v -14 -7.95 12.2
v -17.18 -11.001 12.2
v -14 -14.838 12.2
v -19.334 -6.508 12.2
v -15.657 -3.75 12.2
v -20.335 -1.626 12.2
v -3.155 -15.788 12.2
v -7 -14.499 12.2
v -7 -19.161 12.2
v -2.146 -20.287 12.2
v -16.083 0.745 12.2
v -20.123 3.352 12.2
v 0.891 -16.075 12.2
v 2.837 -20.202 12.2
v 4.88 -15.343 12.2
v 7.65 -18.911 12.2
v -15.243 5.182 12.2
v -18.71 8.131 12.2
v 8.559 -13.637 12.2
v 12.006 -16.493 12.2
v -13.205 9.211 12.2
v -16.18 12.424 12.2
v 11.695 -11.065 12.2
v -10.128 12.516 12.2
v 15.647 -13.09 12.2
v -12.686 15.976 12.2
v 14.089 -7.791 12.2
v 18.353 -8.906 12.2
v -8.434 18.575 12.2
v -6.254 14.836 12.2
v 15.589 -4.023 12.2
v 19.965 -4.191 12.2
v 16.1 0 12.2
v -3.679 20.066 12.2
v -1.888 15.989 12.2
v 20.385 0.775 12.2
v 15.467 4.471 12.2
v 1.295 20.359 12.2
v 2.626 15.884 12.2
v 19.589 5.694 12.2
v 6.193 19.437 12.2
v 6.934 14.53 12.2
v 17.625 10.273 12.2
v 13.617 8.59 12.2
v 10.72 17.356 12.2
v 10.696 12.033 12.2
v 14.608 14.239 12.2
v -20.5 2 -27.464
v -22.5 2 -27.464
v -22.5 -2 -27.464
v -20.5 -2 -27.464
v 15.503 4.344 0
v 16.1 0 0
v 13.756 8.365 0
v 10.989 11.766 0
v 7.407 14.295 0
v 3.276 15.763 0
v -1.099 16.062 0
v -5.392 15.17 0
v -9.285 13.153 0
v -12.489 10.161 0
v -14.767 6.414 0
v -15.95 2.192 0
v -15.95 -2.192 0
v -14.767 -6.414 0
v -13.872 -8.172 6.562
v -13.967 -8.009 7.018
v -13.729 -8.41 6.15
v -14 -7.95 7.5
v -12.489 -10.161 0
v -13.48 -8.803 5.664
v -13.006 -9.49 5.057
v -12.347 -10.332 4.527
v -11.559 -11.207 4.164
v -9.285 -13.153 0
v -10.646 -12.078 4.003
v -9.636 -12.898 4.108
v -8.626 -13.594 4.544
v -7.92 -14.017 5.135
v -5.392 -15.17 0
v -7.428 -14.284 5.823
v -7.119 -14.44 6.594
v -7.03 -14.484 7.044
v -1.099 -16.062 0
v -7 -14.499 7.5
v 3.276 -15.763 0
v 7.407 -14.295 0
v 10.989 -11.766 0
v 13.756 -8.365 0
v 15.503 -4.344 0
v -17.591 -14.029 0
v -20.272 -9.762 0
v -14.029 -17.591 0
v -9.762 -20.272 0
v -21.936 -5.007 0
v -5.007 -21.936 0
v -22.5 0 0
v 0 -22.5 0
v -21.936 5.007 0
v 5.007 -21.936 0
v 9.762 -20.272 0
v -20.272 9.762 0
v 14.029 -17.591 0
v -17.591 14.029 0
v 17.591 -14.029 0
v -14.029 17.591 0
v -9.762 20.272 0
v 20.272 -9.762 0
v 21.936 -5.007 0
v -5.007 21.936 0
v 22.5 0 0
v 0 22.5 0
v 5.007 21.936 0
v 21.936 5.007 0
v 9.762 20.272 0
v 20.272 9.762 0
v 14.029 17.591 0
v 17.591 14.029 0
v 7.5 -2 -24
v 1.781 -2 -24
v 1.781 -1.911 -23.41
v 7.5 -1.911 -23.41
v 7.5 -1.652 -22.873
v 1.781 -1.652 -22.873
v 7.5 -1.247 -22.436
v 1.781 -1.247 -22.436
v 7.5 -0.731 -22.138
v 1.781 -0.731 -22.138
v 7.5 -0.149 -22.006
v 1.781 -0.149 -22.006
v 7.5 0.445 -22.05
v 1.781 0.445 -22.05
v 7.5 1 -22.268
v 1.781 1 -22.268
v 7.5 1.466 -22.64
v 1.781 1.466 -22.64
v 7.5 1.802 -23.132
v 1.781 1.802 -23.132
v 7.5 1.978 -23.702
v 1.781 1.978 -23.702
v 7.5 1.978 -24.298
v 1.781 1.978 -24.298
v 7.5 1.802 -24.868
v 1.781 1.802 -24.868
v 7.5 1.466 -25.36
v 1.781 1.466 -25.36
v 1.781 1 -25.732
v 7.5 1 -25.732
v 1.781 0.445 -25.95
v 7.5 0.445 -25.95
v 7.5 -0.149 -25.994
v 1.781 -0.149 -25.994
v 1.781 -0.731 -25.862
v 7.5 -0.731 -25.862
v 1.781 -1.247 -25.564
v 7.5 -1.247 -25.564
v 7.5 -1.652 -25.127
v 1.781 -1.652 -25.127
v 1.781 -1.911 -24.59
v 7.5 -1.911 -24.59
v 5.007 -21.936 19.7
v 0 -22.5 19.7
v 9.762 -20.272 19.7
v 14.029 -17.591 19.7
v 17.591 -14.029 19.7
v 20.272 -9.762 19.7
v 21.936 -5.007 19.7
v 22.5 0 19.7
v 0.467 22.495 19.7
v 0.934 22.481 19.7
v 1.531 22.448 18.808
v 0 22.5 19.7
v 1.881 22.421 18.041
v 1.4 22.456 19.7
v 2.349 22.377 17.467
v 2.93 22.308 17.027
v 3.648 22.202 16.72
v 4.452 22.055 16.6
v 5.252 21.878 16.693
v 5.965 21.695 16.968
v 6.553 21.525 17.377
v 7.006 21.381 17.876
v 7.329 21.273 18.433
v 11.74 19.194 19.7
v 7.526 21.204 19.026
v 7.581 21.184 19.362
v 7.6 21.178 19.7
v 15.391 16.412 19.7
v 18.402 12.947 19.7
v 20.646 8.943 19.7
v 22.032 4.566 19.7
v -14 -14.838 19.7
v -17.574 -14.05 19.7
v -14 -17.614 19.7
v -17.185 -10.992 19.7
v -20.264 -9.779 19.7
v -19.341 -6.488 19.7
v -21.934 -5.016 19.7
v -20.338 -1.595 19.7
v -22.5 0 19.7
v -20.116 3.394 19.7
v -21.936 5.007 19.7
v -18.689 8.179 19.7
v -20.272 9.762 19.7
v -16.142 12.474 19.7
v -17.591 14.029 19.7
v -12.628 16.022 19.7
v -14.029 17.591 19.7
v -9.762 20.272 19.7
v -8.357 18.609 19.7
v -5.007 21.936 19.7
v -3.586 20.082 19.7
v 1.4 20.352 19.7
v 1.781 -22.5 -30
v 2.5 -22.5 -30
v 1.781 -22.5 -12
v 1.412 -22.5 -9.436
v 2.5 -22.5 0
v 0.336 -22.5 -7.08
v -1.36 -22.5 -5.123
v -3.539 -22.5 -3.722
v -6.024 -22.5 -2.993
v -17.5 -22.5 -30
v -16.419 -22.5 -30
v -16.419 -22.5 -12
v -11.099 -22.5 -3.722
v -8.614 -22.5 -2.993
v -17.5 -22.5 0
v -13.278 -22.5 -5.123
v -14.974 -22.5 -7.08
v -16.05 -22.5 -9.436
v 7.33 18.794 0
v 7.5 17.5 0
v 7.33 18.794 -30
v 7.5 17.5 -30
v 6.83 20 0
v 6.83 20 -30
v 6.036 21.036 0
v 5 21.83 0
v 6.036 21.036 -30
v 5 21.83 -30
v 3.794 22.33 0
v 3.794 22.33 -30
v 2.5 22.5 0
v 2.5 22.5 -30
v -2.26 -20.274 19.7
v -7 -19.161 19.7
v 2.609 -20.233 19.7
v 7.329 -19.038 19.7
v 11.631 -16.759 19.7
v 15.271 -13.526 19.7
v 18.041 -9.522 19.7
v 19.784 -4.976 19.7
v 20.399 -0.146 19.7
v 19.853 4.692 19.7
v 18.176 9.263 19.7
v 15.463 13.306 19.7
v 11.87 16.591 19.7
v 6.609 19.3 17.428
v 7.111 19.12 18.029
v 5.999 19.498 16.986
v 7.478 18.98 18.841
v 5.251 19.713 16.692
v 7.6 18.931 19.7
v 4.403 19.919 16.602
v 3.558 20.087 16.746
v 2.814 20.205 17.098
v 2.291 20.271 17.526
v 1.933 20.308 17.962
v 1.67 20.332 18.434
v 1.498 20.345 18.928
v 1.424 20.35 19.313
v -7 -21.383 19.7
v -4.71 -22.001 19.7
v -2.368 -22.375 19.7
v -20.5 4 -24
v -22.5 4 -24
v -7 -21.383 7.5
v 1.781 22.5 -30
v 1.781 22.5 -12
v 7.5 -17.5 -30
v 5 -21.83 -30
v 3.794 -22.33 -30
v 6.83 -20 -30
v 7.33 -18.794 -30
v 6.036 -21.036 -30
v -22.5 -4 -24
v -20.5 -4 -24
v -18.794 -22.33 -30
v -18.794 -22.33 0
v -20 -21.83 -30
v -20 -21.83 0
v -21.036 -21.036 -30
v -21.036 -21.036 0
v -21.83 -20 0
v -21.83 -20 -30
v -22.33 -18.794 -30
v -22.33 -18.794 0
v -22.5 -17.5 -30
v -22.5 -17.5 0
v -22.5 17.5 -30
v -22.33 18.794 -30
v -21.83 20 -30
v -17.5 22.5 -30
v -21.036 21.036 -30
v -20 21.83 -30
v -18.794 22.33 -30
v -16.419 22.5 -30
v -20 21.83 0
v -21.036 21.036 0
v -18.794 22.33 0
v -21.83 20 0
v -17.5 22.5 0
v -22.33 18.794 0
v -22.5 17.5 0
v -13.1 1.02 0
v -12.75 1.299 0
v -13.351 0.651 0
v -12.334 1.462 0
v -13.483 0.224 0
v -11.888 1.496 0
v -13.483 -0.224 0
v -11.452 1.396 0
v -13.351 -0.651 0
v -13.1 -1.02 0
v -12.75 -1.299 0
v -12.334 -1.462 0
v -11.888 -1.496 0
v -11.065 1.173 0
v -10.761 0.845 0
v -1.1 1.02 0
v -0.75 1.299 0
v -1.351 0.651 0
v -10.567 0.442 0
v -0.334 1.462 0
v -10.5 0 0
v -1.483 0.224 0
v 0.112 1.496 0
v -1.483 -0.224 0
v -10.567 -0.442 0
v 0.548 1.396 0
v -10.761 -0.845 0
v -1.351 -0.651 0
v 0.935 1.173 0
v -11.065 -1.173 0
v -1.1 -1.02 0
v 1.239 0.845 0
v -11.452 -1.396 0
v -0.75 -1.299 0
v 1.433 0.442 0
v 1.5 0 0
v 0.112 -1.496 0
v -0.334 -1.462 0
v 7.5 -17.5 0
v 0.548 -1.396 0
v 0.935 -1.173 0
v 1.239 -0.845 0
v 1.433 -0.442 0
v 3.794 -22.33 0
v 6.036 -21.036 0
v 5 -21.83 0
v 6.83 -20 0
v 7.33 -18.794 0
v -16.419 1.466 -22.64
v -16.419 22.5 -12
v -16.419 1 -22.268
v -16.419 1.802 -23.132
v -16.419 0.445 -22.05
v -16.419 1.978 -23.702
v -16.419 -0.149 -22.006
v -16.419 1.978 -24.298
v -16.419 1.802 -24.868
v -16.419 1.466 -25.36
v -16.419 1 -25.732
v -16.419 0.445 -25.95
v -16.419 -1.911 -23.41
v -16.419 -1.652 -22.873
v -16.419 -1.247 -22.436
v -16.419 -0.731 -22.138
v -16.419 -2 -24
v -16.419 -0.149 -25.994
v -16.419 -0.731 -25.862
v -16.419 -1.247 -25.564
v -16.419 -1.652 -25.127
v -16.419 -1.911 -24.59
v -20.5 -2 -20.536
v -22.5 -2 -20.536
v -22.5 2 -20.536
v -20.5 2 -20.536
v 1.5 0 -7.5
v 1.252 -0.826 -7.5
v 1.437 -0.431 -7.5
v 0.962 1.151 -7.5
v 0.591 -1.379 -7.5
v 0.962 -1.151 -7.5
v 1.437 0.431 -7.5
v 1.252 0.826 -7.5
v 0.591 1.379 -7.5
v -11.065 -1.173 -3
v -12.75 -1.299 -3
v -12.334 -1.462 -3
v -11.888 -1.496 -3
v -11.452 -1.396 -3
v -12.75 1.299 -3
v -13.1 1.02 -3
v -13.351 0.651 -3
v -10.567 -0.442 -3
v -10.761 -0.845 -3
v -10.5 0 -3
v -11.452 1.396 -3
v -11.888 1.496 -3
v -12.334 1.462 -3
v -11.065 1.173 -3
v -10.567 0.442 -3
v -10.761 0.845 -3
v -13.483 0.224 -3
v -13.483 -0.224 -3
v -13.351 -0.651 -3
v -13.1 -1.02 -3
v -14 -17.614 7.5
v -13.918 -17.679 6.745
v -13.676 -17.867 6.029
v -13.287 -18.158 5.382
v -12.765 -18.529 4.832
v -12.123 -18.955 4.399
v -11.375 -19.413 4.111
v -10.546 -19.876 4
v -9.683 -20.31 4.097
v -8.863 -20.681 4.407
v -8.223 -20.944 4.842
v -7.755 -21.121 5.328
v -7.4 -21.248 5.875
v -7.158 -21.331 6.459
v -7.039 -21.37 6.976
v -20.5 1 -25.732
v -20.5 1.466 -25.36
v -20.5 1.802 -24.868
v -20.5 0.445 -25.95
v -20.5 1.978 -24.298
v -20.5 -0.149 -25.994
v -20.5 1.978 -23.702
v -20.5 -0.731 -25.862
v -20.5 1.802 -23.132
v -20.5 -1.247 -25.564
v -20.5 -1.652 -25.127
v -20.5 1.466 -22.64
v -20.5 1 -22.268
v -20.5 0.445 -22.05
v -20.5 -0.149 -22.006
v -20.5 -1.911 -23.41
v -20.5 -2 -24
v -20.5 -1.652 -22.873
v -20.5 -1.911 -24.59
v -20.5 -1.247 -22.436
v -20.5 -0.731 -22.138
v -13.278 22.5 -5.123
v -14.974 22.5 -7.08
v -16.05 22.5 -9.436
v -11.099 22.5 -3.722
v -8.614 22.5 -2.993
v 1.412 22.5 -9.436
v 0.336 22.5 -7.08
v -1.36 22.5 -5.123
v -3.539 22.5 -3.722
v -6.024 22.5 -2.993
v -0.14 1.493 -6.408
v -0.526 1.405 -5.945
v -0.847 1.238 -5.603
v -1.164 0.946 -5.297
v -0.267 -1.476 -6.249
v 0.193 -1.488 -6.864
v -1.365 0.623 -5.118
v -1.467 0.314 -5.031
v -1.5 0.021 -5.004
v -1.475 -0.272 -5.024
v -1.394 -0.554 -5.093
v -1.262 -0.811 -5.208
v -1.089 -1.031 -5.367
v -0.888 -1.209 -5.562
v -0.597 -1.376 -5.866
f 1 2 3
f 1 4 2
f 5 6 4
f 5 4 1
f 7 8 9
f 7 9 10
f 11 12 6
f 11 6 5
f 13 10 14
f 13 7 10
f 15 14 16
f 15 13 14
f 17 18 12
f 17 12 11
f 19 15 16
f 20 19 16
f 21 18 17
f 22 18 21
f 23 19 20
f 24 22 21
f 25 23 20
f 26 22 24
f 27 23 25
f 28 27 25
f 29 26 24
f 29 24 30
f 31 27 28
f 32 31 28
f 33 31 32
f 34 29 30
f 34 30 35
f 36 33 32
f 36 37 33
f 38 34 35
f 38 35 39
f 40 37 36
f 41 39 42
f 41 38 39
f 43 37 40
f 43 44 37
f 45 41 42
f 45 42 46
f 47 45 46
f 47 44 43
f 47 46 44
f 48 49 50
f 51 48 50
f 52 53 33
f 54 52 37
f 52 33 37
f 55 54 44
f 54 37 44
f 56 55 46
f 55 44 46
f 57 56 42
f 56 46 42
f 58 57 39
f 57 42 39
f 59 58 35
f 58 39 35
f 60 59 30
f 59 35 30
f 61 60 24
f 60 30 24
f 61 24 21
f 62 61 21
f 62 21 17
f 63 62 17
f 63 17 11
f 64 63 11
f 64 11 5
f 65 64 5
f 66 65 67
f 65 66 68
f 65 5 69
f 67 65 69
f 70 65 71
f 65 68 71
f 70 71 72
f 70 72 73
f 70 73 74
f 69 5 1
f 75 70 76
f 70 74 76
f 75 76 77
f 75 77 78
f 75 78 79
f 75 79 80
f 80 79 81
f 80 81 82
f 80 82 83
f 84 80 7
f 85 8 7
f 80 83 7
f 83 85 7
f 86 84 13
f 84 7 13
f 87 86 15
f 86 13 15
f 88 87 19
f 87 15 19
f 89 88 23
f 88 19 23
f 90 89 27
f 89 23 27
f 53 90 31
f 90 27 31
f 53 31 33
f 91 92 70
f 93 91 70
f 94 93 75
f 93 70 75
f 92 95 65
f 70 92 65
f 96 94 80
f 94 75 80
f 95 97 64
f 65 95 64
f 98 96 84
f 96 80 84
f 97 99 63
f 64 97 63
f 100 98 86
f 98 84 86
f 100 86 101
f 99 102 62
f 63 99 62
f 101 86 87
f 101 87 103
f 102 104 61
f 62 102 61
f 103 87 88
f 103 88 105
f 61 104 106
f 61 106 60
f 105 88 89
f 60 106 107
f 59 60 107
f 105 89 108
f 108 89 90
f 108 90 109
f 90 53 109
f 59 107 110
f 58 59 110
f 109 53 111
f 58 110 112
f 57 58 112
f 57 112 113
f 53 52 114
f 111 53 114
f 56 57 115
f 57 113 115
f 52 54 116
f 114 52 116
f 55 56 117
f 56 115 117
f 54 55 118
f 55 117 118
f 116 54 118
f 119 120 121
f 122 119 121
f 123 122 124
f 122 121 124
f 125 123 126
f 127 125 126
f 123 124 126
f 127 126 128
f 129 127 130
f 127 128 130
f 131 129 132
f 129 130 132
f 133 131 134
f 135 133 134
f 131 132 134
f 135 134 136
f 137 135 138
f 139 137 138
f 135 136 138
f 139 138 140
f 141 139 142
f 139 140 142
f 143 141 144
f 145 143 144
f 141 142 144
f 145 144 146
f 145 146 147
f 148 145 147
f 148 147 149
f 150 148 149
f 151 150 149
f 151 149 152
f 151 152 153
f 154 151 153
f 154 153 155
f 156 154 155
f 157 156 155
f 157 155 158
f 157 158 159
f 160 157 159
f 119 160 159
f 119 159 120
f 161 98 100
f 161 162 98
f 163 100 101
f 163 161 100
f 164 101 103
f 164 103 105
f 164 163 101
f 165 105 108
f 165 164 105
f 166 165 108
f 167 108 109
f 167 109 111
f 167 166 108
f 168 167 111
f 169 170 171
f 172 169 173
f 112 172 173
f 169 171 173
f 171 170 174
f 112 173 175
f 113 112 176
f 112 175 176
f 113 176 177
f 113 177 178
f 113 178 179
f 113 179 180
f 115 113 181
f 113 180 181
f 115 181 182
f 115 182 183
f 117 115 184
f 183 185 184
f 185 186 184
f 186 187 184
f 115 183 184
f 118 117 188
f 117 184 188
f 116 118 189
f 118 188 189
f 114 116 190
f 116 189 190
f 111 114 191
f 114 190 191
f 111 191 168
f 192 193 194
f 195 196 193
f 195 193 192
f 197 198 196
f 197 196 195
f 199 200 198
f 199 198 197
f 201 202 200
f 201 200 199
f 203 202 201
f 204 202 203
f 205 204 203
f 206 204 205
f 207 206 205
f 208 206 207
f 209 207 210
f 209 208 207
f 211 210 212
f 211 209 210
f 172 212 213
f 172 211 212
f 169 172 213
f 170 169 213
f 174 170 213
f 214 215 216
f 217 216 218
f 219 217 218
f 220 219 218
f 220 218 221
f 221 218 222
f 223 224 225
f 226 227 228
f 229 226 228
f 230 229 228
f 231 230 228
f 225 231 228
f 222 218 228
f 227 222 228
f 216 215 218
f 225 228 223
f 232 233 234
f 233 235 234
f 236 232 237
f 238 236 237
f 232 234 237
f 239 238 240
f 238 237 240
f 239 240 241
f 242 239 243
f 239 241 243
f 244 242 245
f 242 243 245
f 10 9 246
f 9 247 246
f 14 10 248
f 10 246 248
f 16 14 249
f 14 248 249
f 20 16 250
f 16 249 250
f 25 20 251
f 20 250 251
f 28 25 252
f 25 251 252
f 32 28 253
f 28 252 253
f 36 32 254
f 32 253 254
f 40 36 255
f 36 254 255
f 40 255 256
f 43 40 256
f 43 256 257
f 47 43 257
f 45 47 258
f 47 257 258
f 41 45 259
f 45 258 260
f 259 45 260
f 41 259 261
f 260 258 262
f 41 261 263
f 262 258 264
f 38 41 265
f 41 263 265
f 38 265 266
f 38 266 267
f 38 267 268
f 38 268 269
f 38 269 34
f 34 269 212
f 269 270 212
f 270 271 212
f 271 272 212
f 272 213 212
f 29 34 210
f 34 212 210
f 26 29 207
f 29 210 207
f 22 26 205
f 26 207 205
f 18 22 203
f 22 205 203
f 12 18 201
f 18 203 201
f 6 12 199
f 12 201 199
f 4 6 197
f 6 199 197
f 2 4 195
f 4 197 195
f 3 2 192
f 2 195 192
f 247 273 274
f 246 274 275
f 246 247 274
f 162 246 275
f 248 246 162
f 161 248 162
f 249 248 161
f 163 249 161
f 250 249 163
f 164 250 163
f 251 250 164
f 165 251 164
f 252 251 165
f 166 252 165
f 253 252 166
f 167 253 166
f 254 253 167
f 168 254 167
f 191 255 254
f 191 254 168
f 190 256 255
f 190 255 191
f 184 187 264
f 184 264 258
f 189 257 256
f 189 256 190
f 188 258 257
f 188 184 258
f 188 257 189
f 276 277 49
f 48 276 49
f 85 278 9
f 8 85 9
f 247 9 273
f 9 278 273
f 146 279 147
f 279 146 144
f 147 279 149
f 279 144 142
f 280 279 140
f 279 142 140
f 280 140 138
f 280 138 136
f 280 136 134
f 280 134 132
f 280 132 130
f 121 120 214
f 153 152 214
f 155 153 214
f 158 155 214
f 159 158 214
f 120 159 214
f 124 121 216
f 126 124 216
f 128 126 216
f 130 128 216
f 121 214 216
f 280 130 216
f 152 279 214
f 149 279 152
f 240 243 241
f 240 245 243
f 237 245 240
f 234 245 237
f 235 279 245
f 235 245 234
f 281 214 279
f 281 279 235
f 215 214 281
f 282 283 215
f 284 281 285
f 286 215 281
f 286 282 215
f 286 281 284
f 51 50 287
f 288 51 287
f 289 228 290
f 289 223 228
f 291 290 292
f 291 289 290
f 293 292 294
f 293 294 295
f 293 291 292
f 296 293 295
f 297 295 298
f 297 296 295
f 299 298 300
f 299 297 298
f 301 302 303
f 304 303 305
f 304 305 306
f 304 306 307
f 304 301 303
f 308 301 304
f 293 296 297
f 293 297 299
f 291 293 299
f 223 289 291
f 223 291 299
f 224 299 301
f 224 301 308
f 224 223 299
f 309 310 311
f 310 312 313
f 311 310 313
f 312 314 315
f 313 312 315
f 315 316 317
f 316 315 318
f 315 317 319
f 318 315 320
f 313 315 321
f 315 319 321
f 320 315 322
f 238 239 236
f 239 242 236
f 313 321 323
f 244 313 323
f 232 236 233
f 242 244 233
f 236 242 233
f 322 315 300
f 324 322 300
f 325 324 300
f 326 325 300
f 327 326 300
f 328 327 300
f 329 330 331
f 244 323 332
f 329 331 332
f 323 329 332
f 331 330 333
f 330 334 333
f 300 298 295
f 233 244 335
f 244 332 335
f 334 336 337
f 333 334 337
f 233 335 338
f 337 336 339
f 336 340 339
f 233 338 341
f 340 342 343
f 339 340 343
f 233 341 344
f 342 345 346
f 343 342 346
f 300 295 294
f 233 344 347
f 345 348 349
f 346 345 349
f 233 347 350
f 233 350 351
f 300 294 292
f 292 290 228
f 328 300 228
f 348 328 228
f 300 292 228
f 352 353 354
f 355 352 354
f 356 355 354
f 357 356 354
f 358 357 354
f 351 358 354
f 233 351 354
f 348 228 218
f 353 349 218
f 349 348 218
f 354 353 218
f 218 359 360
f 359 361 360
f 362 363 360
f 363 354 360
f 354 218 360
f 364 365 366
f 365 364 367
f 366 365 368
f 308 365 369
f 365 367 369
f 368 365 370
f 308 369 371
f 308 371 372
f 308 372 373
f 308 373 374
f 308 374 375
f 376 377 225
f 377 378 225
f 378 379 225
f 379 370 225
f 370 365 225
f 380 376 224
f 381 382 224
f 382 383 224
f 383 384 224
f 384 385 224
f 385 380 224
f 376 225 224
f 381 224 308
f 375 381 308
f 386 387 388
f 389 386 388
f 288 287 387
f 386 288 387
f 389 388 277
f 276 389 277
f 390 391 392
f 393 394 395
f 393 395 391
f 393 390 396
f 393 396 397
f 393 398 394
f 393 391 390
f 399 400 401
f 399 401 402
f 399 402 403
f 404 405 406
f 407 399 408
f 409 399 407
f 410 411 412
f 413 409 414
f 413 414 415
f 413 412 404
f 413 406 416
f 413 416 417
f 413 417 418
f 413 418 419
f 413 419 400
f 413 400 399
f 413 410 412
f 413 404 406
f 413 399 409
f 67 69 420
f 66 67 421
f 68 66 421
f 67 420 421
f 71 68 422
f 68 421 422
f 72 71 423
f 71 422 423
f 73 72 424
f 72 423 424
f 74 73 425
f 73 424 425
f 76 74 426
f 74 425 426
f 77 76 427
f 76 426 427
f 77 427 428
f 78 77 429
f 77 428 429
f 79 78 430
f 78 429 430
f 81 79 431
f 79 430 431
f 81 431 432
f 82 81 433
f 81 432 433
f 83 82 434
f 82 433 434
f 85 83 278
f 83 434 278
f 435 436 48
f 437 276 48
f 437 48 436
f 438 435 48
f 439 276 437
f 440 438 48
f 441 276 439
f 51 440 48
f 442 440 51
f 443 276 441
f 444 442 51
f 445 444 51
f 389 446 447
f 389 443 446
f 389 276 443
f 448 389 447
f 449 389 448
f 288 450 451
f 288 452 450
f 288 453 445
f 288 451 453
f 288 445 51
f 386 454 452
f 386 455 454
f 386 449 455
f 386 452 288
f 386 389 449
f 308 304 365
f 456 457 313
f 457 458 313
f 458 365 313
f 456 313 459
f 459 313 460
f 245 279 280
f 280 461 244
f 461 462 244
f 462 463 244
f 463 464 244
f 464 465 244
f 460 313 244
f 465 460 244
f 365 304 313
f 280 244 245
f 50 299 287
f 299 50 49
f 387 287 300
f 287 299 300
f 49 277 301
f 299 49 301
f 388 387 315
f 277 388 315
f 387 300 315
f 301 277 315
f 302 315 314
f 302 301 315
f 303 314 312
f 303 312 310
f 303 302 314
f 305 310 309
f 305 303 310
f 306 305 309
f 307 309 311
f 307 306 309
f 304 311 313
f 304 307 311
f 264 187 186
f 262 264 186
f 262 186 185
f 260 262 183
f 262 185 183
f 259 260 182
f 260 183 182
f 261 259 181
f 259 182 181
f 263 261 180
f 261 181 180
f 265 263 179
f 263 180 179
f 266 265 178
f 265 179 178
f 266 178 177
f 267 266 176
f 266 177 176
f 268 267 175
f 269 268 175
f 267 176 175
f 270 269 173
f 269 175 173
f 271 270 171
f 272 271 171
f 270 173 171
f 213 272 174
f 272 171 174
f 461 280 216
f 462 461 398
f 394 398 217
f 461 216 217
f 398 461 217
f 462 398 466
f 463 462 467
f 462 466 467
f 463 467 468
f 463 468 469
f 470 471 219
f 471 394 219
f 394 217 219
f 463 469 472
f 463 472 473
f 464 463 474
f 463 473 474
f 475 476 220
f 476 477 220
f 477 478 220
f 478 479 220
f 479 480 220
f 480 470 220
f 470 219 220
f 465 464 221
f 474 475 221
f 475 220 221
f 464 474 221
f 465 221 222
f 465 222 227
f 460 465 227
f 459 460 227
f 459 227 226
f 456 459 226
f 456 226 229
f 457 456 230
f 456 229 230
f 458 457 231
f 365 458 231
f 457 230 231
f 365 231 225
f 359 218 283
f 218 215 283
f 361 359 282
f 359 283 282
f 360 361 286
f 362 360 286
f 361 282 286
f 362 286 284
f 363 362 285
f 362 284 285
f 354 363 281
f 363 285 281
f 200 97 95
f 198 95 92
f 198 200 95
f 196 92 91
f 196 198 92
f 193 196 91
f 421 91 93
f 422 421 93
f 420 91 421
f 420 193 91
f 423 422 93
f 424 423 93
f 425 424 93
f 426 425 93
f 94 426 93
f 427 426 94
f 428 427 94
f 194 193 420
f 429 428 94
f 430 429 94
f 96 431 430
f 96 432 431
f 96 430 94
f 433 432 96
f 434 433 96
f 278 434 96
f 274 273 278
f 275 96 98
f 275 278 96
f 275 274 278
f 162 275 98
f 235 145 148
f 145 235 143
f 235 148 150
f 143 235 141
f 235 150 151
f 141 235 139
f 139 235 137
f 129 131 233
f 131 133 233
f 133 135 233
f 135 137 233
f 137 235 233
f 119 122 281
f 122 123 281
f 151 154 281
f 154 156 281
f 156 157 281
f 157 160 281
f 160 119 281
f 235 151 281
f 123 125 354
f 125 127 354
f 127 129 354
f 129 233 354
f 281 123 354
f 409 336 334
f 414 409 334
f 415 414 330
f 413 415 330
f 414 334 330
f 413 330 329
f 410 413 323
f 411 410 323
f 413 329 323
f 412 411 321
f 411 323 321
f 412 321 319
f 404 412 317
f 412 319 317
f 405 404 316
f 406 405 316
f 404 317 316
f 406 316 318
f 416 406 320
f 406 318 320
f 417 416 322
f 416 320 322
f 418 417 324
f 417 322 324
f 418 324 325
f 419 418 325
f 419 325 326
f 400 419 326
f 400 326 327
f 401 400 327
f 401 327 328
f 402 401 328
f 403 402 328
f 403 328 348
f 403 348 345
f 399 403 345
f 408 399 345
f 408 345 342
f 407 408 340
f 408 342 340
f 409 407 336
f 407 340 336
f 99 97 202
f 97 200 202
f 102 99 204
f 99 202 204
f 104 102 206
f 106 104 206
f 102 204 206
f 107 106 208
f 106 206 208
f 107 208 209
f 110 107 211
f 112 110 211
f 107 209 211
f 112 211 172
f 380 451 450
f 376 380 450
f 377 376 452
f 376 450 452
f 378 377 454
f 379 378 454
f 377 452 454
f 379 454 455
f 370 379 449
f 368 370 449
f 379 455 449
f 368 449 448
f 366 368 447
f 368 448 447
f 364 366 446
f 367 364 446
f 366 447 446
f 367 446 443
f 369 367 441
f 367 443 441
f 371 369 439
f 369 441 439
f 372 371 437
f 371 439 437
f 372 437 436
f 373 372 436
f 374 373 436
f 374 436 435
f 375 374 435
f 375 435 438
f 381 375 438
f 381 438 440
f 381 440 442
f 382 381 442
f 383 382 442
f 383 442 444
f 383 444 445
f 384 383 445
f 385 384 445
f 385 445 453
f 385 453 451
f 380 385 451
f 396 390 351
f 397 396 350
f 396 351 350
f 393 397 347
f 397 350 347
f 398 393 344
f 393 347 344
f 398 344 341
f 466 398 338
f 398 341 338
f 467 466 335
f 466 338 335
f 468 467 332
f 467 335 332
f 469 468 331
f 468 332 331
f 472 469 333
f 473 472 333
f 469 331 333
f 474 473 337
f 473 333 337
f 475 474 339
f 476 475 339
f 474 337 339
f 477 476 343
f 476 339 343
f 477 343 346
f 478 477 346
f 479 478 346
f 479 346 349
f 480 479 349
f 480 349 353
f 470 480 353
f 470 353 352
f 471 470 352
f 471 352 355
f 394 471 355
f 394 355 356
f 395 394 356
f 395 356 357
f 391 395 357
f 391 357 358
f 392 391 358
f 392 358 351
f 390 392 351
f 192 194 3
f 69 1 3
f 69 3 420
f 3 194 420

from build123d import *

# Parameters (mm, degrees)
F0_W      = 45
F0_H      = 45
F1_DEPTH  = 19.7
F2_R      = 20.4
F3_DEPTH  = 7.5
F4_R      = 16.1
F5_DEPTH  = 12.2
F7_DEPTH  = 14.5505284159
F9_DEPTH  = 3.5695447941
F11_DEPTH = 30
F13_DEPTH = 45
F14_R     = 22.49999
F16_DEPTH = 2
F17_R     = 2
F18_DEPTH = 43.0010001
F19_R     = 5
F20_R     = 1.5
F21_DEPTH = 7.5
F22_R     = 1.5
F23_DEPTH = 3


# Not quite as in the source:
# - a fillet or chamfer is up to 0.001 mm smaller than in the source, because OpenCascade refuses the exact size


with BuildPart() as f1:
    # F0 (on Top) → F1 (new body)
    with BuildSketch(Plane.XY):
        Rectangle(F0_W, F0_H)
    extrude(amount=F1_DEPTH)

    # F2 (on face) → F3 (cut)
    with BuildSketch(Plane.XY.offset(19.7)):
        Circle(F2_R)
    extrude(amount=-F3_DEPTH, mode=Mode.SUBTRACT)

    # F4 (on face) → F5 (cut, through all)
    with BuildSketch(Plane.XY.offset(12.2)):
        Circle(F4_R)
    extrude(amount=-F5_DEPTH, mode=Mode.SUBTRACT)

    # F6 (on face) → F7 (cut, through all)
    with BuildSketch(Plane.XZ.offset(22.5)):
        with BuildLine():
            Line((-14, 19.7), (-14, 7.5))
            ThreePointArc((-14, 7.5), (-10.5, 4), (-7, 7.5))
            Line((-7, 7.5), (-7, 19.7))
            Line((-7, 19.7), (-14, 19.7))
        make_face()
    extrude(amount=-F7_DEPTH, mode=Mode.SUBTRACT)

    # F8 (on face) → F9 (cut, through all)
    with BuildSketch(Plane(origin=(0, 22.5, 0), x_dir=(-1, 0, 0), z_dir=(0, 1, 0))):
        with BuildLine():
            Line((-1.4, 19.7), (-7.6, 19.7))
            ThreePointArc((-7.6, 19.7), (-4.5, 16.6), (-1.4, 19.7))
        make_face()
    extrude(amount=-F9_DEPTH, mode=Mode.SUBTRACT)

    # F14 (radius 22.5 in the source; OpenCascade refuses exactly that, so slightly less here)
    f14_edges = [f1.edges().sort_by_distance(p)[0] for p in [
        (22.5, -22.5, 9.85),
        (-22.5, -22.5, 9.85),
        (-22.5, 22.5, 9.85),
        (22.5, 22.5, 9.85),
    ]]
    fillet(f14_edges, radius=F14_R)


with BuildPart() as f11:
    # F10 (on face) → F11 (new body)
    with BuildSketch(Plane(origin=(0, 0, 0), x_dir=(1, 0, 0), z_dir=(0, 0, -1))):
        with BuildLine():
            Line((7.5, 22.5), (-22.5, 22.5))
            Line((-22.5, 22.5), (-22.5, -22.5))
            Line((-22.5, -22.5), (7.5, -22.5))
            Line((7.5, -22.5), (7.5, -14.2464030548))
            ThreePointArc((7.5, -14.2464030548), (-16.1, 0), (7.5, 14.2464030548))
            Line((7.5, 14.2464030548), (7.5, 22.5))
        make_face()
        with BuildLine():
            Line((7.5, -14.2464030548), (7.5, 14.2464030548))
            ThreePointArc((7.5, 14.2464030548), (-16.1, 0), (7.5, -14.2464030548))
        make_face()
    extrude(amount=F11_DEPTH)

    # F12 (on face) → F13 (cut, through all)
    with BuildSketch(Plane.XZ.offset(22.5)):
        with BuildLine():
            Line((1.7810865191, -30), (1.7810865191, -12))
            ThreePointArc((1.7810865191, -12), (-7.3189134809, -2.9), (-16.4189134809, -12))
            Line((-16.4189134809, -12), (-16.4189134809, -30))
            Line((-16.4189134809, -30), (1.7810865191, -30))
        make_face()
    extrude(amount=-F13_DEPTH, mode=Mode.SUBTRACT)

    # F15 (on face) → F16 (cut)
    with BuildSketch(Plane(origin=(-22.5, 0, 0), x_dir=(0, -1, 0), z_dir=(-1, 0, 0))):
        Polygon((-2, -27.4641016151), (2, -27.4641016151), (4, -24), (2, -20.5358983849), (-2, -20.5358983849), (-4, -24), align=None)
    extrude(amount=-F16_DEPTH, mode=Mode.SUBTRACT)

    # F17 (on face) → F18 (cut, through all)
    with BuildSketch(Plane(origin=(-20.5, 0, 0), x_dir=(0, -1, 0), z_dir=(-1, 0, 0))):
        with Locations((0, -24)):
            Circle(F17_R)
    extrude(amount=-F18_DEPTH, mode=Mode.SUBTRACT)

    # F19
    f19_edges = [f11.edges().sort_by_distance(p)[0] for p in [
        (-22.5, -22.5, -15),
        (7.5, -22.5, -15),
        (7.5, 22.5, -15),
        (-22.5, 22.5, -15),
    ]]
    fillet(f19_edges, radius=F19_R)

    # F20 (on face) → F21 (cut)
    with BuildSketch(Plane.XY):
        Circle(F20_R)
    extrude(amount=-F21_DEPTH, mode=Mode.SUBTRACT)

    # F22 (on face) → F23 (cut)
    with BuildSketch(Plane.XY):
        with Locations((-12, 0)):
            Circle(F22_R)
    extrude(amount=-F23_DEPTH, mode=Mode.SUBTRACT)


solid = Compound([f1.part, f11.part])
